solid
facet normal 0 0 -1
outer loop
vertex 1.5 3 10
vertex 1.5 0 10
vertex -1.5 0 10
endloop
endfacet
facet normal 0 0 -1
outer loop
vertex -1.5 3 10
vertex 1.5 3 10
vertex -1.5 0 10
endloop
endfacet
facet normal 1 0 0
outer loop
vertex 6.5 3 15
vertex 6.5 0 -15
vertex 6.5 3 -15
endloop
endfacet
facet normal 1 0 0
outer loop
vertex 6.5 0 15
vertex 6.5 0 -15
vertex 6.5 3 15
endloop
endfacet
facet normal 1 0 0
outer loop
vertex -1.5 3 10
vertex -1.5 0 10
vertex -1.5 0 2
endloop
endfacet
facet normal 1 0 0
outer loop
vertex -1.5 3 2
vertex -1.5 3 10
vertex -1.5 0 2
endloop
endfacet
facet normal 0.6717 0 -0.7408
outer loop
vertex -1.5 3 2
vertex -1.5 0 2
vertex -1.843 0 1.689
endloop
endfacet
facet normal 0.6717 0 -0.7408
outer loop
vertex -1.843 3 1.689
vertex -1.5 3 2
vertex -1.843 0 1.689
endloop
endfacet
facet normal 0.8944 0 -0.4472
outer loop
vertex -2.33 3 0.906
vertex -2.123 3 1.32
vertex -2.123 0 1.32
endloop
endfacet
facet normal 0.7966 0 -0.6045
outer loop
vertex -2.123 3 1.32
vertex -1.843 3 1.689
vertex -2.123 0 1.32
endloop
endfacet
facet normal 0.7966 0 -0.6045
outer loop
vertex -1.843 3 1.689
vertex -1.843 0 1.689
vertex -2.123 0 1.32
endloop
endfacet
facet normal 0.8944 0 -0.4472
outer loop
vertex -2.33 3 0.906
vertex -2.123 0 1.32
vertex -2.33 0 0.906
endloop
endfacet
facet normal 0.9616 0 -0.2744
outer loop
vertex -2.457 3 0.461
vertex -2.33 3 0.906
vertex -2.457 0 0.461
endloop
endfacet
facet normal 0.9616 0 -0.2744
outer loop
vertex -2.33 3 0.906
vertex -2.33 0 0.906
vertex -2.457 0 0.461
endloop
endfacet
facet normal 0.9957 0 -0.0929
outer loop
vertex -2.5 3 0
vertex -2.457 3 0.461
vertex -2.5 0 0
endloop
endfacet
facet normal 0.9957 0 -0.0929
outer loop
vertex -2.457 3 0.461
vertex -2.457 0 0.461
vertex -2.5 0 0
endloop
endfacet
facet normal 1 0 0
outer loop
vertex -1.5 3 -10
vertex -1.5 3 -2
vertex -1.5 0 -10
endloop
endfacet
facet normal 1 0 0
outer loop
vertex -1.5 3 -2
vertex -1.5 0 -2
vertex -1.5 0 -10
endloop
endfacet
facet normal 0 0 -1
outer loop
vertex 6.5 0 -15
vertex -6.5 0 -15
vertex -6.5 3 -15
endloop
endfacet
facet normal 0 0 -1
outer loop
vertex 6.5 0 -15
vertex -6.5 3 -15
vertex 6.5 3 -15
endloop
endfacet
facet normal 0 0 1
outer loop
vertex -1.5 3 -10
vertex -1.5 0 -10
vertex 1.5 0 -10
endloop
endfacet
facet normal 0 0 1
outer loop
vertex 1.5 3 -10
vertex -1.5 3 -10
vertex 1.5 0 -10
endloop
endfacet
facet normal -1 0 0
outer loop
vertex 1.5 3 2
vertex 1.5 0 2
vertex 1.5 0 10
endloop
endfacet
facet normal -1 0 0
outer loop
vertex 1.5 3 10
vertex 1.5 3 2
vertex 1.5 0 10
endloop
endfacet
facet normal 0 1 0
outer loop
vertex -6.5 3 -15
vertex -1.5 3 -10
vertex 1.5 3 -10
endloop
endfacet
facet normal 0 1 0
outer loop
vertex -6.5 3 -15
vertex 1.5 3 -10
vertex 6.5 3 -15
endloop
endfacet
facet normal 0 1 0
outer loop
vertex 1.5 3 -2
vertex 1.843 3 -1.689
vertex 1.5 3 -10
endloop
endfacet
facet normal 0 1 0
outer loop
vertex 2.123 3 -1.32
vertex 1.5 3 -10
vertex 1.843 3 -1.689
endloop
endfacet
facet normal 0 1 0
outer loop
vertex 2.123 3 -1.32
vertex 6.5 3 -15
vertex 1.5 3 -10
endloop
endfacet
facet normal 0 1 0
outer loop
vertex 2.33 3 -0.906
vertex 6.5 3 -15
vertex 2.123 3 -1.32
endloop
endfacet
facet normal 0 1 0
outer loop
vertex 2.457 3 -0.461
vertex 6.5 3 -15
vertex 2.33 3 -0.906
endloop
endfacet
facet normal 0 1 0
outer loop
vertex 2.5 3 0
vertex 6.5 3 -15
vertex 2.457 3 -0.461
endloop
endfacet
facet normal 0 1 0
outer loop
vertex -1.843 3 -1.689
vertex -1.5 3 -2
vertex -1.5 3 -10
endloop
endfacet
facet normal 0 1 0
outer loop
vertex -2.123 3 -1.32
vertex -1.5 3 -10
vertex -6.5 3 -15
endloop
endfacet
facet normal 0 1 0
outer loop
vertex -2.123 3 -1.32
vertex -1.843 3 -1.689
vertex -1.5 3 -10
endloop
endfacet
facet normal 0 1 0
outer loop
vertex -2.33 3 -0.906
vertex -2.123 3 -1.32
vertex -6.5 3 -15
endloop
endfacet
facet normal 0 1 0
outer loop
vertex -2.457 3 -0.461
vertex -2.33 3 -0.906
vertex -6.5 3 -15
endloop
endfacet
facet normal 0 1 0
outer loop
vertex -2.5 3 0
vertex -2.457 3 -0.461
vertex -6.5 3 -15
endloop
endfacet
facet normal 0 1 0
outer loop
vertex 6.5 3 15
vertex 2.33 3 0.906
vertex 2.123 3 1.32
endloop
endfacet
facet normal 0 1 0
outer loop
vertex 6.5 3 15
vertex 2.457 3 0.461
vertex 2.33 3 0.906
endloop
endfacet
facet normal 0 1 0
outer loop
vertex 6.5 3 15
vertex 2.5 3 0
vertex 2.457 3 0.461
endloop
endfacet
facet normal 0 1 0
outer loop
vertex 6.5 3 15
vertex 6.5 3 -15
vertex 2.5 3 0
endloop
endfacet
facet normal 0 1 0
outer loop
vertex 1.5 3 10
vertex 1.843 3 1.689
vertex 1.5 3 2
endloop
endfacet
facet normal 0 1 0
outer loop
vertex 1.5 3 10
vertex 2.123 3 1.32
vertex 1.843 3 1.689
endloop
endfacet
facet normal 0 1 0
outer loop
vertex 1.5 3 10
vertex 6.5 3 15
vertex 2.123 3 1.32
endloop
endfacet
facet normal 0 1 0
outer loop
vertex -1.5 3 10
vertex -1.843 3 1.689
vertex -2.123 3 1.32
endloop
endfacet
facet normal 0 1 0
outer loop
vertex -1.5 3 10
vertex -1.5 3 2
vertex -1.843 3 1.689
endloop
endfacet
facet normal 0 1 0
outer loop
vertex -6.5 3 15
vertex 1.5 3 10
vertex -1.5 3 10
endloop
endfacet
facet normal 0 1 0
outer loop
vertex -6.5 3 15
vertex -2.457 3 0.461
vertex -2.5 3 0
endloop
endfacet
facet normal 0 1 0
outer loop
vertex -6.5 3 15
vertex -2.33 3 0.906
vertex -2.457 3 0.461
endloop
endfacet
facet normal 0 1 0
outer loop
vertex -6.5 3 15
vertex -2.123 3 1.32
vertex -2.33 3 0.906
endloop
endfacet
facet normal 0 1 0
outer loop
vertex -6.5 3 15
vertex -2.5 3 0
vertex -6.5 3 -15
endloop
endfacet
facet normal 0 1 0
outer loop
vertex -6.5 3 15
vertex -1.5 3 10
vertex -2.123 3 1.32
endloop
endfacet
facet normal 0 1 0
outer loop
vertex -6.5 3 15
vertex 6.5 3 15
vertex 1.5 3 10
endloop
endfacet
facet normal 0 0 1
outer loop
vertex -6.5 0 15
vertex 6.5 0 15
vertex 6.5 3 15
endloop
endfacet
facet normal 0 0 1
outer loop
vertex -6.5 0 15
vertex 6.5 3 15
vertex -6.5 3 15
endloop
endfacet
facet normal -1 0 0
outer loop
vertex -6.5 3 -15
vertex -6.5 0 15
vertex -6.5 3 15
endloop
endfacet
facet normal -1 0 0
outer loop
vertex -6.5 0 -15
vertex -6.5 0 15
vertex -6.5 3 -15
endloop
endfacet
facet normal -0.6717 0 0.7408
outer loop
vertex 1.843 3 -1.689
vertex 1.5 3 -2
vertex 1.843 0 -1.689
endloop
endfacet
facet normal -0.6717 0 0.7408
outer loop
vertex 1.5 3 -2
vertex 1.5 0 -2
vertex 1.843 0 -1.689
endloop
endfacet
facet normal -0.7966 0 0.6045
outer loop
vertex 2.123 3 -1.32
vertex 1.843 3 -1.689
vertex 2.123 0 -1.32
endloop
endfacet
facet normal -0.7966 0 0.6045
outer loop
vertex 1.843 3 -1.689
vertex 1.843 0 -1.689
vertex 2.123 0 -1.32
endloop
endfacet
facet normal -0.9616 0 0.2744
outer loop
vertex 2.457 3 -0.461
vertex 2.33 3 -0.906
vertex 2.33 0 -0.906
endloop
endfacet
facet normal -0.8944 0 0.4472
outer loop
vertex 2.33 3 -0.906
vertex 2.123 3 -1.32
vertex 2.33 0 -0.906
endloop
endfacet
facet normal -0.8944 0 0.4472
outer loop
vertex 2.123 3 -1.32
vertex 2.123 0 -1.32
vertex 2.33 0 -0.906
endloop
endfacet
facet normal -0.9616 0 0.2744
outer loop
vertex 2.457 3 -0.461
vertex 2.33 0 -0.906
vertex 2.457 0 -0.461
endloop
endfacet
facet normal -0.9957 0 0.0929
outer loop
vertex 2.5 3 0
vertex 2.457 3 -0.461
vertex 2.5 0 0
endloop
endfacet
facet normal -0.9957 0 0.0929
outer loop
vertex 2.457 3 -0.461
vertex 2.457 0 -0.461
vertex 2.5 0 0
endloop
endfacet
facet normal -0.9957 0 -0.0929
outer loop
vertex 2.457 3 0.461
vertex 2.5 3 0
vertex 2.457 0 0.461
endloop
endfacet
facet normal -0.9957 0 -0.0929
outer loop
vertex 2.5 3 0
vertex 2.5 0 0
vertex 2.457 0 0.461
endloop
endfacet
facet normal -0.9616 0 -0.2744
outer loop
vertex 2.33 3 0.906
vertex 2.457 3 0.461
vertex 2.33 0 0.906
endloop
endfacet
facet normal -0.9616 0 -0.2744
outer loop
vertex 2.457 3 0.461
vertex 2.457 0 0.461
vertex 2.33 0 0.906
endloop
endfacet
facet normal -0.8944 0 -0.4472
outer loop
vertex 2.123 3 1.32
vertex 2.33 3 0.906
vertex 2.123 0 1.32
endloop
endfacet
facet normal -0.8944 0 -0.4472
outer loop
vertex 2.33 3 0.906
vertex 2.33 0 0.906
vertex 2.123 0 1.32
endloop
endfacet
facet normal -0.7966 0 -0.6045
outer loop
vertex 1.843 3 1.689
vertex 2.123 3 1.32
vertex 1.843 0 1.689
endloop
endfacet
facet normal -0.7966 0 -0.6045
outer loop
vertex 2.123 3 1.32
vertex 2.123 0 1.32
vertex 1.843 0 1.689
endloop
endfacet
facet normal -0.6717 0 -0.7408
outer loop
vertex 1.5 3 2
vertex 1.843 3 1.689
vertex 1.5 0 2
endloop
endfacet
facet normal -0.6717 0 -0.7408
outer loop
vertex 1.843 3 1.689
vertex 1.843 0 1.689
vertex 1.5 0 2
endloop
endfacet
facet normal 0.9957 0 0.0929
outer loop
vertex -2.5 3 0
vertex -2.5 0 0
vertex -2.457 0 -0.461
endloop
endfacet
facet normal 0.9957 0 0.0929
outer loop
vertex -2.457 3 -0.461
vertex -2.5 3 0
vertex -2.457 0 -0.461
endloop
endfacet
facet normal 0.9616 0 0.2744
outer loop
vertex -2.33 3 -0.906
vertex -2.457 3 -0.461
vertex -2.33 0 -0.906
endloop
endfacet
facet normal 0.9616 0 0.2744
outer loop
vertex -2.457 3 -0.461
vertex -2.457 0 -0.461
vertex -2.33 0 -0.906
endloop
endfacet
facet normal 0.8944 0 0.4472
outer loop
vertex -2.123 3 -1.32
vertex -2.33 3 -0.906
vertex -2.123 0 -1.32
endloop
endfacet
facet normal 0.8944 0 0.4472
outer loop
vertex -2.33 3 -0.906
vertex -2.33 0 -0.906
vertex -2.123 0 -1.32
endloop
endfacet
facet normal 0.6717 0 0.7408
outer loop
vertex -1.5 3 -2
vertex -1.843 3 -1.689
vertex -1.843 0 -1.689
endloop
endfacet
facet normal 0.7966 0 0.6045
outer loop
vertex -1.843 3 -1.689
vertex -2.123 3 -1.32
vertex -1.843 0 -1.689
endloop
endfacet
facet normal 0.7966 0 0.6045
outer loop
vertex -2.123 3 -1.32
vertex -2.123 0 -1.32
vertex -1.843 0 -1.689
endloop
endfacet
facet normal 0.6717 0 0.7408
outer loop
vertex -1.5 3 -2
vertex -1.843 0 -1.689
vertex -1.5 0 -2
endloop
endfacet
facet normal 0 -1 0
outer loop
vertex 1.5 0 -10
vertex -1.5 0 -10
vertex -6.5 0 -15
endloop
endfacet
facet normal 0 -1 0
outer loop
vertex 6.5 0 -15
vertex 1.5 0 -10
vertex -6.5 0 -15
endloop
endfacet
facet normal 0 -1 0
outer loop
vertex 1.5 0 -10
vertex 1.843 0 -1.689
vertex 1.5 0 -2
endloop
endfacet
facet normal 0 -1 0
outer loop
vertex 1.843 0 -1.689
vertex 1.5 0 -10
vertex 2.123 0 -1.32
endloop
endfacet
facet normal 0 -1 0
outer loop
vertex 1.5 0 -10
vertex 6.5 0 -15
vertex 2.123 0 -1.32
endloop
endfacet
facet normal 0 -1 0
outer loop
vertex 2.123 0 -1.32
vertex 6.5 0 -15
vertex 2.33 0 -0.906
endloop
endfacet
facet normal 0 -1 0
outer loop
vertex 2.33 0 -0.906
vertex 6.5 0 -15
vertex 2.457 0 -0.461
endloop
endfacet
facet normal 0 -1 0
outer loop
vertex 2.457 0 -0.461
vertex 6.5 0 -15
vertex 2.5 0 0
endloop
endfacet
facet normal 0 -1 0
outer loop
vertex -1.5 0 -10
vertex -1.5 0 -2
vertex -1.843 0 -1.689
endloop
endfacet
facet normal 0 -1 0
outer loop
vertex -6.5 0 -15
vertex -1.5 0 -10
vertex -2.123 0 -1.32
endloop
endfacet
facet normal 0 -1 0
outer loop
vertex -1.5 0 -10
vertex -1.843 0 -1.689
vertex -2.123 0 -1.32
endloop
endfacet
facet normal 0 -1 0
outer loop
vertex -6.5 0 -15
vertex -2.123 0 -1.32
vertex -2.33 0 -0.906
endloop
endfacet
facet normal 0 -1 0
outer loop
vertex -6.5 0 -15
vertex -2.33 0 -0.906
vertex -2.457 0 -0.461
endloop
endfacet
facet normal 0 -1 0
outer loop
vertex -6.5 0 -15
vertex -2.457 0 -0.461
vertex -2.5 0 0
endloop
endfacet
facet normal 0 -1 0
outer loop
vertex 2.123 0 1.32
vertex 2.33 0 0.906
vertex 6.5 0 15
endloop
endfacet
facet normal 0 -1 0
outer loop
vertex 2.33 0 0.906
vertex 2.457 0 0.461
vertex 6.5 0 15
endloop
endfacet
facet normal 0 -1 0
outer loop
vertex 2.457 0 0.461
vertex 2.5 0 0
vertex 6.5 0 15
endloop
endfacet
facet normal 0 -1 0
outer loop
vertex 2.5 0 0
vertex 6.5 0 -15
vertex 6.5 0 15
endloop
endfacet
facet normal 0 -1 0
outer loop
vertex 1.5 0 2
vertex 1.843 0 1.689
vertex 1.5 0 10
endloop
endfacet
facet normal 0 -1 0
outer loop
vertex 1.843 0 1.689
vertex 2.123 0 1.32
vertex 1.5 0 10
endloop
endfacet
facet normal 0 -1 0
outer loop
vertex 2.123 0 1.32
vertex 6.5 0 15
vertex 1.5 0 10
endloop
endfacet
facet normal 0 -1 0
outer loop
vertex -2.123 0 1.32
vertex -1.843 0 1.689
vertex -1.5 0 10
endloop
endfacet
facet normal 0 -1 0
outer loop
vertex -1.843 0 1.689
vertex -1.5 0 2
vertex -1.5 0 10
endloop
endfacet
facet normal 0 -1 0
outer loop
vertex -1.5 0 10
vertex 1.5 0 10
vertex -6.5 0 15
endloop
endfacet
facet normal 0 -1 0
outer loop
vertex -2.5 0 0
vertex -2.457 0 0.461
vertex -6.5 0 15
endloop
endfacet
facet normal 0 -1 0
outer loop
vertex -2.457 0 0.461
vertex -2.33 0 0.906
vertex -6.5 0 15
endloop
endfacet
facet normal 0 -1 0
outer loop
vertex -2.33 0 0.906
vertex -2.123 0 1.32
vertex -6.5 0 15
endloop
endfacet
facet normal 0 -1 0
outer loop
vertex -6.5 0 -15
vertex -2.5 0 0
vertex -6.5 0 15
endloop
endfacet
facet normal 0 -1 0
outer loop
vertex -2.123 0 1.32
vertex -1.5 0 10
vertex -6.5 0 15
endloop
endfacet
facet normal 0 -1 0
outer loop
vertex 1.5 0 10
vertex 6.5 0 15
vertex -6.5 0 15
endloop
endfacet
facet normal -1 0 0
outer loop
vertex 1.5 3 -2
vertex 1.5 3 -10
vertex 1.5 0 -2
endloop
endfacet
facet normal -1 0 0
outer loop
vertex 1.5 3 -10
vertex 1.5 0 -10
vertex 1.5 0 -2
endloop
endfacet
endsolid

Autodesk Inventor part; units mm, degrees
ref_plane "YZ Plane" through (0, 0, 0) normal (1, 0, 0) x (0, 1, 0)
ref_plane "XZ Plane" through (0, 0, 0) normal (0, 1, 0) x (-1, 0, 0)
ref_plane "XY Plane" through (0, 0, 0) normal (0, 0, 1) x (1, 0, 0)
sketch "Sketch1" plane through (0, 0, 0) normal (0, 1, 0) x (-1, 0, 0)
  line L0 (-6.5, 15) -> (6.5, 15)
  line L1 (6.5, 15) -> (6.5, -15)
  line L2 (6.5, -15) -> (-6.5, -15)
  line L3 (-6.5, -15) -> (-6.5, 15)
  line L4 (-6.5, 15) -> (6.5, -15) construction
  line L5 (6.5, 15) -> (-6.5, -15) construction
  line L6 (-1.5, 10) -> (1.5, 10)
  line L7 (1.5, 10) -> (1.5, -10)
  line L8 (1.5, -10) -> (-1.5, -10)
  line L9 (-1.5, -10) -> (-1.5, 10)
  line L10 (-1.5, 10) -> (1.5, -10) construction
  line L11 (1.5, 10) -> (-1.5, -10) construction
  circle A0 centre (0, 0) radius 2.5
  point P0 (-1.5, -2)
  point P1 (-1.5, 2)
  point P2 (1.5, 2)
  point P3 (1.5, -2)
  dimension "d0" = 5
  dimension "d1" = 20
  dimension "d2" = 5
  dimension "d3" = 4
  dimension "d4" = 3
extrude "Extrusion1" add sketch "Sketch1" along normal blind 3
properties part number "Acoplador" material "Brass"
